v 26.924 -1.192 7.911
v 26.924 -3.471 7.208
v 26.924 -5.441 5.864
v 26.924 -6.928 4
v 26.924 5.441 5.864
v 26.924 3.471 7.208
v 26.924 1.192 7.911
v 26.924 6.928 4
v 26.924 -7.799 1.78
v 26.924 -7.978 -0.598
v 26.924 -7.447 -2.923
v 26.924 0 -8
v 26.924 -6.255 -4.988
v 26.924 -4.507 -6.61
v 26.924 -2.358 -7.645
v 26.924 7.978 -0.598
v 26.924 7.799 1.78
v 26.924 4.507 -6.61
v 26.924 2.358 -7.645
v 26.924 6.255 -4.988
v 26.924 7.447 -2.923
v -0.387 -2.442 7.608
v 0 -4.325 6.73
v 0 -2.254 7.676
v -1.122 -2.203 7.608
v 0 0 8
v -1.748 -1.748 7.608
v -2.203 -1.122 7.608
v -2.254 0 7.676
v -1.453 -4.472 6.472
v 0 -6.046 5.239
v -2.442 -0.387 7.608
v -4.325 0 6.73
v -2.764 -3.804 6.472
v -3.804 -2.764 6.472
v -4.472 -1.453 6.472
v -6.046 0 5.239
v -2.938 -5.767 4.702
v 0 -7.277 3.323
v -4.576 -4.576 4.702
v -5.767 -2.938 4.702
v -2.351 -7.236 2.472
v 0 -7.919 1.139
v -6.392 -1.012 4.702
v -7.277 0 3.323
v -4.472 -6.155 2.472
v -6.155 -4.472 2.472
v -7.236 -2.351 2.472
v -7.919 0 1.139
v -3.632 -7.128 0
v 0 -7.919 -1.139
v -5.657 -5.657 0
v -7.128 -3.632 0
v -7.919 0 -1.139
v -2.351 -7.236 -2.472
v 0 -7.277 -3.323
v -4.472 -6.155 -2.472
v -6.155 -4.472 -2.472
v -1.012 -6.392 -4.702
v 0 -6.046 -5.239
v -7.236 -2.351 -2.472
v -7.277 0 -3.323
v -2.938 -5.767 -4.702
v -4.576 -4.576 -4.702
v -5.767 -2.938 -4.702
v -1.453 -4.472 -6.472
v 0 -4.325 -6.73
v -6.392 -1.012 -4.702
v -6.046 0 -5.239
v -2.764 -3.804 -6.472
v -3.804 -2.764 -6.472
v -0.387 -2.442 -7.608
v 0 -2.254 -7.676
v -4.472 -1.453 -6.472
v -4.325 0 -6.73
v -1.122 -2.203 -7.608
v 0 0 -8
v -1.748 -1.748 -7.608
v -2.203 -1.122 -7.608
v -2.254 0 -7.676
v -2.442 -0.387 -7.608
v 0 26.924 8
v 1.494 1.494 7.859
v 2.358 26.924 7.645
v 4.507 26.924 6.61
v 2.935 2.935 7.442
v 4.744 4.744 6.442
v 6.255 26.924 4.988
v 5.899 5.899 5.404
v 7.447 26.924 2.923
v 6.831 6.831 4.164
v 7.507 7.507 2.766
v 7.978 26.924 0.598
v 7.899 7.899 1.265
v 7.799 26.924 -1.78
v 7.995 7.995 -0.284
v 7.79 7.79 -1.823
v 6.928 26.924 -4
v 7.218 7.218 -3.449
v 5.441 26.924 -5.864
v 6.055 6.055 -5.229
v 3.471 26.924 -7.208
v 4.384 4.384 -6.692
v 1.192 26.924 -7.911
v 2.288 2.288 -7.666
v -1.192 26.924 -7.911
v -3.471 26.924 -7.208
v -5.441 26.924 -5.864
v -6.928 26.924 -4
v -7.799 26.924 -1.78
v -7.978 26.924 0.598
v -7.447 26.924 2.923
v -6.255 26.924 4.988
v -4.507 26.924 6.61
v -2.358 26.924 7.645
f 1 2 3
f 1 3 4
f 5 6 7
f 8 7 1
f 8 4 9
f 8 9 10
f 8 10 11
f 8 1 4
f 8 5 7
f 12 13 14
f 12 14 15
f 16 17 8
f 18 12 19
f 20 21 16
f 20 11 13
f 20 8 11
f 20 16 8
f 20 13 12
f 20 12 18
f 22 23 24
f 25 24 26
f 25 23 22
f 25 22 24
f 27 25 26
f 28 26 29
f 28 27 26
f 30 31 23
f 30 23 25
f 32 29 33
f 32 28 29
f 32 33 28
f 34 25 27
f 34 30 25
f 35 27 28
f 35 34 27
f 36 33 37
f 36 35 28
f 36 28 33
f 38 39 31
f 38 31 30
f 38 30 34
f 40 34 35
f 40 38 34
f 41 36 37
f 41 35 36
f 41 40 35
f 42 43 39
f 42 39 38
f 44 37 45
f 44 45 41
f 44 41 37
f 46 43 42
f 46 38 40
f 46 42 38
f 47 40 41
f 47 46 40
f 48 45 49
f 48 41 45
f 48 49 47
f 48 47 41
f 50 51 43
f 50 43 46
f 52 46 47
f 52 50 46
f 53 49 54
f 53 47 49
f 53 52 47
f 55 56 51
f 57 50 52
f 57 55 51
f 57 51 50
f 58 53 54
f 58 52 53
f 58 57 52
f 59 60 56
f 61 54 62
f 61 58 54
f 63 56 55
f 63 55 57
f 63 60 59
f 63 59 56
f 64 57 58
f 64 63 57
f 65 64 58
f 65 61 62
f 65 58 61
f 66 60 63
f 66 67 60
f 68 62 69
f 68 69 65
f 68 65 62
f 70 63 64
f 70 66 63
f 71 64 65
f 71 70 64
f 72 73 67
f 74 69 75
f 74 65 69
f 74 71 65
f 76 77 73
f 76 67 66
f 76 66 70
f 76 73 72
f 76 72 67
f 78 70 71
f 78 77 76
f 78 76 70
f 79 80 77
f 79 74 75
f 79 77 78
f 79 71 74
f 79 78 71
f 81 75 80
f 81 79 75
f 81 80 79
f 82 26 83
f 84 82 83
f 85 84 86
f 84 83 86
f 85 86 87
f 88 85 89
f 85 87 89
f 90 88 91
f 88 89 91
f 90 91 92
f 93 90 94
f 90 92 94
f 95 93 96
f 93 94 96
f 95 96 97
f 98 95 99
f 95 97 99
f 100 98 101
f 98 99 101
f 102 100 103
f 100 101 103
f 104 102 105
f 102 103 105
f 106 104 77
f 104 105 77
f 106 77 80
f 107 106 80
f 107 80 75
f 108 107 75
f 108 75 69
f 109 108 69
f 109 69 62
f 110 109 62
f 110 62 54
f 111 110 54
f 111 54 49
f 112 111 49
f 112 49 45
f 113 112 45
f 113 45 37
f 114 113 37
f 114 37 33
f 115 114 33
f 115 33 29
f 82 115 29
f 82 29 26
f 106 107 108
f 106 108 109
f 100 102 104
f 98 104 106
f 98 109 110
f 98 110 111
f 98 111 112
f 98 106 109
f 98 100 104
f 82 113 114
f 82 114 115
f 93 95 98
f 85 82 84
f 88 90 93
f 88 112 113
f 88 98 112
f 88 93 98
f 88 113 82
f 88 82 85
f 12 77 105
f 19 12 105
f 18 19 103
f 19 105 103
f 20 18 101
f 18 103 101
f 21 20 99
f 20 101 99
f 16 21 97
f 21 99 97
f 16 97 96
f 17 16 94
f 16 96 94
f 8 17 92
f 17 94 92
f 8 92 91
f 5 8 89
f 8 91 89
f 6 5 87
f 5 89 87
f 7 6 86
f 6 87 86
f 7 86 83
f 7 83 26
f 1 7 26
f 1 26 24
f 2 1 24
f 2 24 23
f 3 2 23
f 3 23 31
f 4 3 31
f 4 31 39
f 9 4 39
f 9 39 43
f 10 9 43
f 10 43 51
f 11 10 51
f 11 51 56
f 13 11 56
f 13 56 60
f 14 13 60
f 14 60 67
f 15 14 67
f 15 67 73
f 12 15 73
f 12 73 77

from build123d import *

# Parameters (mm, degrees)
SKETCH1_R           = 8
BOSS_EXTRUDE1_DEPTH = 26.924
SKETCH2_R           = 8
BOSS_EXTRUDE2_DEPTH = 26.924
REVOLVE1_ANGLE      = 90


with BuildPart() as part:
    # Sketch1 → Boss-Extrude1 (new body)
    with BuildSketch(Plane(origin=(0, 0, 0), x_dir=(1, 0, 0), z_dir=(0, 1, 0))):
        with Locations(Location((0, 0, 0), (0, 0, 270))):
            Circle(SKETCH1_R)
    extrude(amount=BOSS_EXTRUDE1_DEPTH)

    # Sketch2 → Boss-Extrude2 (add)
    with BuildSketch(Plane(origin=(0, 0, 0), x_dir=(0, 0, -1), z_dir=(1, 0, 0))):
        Circle(SKETCH2_R)
    extrude(amount=BOSS_EXTRUDE2_DEPTH)

    # Sketch3 → Revolve1 (revolve)
    with BuildSketch(Plane.ZY):
        with BuildLine():
            Line((-8, 0), (8, 0))
            ThreePointArc((8, 0), (0, -8), (-8, 0))
        make_face()
    revolve(axis=Axis((0, 0, 0), (0, 0, -1)), revolution_arc=REVOLVE1_ANGLE)


solid = part.part
